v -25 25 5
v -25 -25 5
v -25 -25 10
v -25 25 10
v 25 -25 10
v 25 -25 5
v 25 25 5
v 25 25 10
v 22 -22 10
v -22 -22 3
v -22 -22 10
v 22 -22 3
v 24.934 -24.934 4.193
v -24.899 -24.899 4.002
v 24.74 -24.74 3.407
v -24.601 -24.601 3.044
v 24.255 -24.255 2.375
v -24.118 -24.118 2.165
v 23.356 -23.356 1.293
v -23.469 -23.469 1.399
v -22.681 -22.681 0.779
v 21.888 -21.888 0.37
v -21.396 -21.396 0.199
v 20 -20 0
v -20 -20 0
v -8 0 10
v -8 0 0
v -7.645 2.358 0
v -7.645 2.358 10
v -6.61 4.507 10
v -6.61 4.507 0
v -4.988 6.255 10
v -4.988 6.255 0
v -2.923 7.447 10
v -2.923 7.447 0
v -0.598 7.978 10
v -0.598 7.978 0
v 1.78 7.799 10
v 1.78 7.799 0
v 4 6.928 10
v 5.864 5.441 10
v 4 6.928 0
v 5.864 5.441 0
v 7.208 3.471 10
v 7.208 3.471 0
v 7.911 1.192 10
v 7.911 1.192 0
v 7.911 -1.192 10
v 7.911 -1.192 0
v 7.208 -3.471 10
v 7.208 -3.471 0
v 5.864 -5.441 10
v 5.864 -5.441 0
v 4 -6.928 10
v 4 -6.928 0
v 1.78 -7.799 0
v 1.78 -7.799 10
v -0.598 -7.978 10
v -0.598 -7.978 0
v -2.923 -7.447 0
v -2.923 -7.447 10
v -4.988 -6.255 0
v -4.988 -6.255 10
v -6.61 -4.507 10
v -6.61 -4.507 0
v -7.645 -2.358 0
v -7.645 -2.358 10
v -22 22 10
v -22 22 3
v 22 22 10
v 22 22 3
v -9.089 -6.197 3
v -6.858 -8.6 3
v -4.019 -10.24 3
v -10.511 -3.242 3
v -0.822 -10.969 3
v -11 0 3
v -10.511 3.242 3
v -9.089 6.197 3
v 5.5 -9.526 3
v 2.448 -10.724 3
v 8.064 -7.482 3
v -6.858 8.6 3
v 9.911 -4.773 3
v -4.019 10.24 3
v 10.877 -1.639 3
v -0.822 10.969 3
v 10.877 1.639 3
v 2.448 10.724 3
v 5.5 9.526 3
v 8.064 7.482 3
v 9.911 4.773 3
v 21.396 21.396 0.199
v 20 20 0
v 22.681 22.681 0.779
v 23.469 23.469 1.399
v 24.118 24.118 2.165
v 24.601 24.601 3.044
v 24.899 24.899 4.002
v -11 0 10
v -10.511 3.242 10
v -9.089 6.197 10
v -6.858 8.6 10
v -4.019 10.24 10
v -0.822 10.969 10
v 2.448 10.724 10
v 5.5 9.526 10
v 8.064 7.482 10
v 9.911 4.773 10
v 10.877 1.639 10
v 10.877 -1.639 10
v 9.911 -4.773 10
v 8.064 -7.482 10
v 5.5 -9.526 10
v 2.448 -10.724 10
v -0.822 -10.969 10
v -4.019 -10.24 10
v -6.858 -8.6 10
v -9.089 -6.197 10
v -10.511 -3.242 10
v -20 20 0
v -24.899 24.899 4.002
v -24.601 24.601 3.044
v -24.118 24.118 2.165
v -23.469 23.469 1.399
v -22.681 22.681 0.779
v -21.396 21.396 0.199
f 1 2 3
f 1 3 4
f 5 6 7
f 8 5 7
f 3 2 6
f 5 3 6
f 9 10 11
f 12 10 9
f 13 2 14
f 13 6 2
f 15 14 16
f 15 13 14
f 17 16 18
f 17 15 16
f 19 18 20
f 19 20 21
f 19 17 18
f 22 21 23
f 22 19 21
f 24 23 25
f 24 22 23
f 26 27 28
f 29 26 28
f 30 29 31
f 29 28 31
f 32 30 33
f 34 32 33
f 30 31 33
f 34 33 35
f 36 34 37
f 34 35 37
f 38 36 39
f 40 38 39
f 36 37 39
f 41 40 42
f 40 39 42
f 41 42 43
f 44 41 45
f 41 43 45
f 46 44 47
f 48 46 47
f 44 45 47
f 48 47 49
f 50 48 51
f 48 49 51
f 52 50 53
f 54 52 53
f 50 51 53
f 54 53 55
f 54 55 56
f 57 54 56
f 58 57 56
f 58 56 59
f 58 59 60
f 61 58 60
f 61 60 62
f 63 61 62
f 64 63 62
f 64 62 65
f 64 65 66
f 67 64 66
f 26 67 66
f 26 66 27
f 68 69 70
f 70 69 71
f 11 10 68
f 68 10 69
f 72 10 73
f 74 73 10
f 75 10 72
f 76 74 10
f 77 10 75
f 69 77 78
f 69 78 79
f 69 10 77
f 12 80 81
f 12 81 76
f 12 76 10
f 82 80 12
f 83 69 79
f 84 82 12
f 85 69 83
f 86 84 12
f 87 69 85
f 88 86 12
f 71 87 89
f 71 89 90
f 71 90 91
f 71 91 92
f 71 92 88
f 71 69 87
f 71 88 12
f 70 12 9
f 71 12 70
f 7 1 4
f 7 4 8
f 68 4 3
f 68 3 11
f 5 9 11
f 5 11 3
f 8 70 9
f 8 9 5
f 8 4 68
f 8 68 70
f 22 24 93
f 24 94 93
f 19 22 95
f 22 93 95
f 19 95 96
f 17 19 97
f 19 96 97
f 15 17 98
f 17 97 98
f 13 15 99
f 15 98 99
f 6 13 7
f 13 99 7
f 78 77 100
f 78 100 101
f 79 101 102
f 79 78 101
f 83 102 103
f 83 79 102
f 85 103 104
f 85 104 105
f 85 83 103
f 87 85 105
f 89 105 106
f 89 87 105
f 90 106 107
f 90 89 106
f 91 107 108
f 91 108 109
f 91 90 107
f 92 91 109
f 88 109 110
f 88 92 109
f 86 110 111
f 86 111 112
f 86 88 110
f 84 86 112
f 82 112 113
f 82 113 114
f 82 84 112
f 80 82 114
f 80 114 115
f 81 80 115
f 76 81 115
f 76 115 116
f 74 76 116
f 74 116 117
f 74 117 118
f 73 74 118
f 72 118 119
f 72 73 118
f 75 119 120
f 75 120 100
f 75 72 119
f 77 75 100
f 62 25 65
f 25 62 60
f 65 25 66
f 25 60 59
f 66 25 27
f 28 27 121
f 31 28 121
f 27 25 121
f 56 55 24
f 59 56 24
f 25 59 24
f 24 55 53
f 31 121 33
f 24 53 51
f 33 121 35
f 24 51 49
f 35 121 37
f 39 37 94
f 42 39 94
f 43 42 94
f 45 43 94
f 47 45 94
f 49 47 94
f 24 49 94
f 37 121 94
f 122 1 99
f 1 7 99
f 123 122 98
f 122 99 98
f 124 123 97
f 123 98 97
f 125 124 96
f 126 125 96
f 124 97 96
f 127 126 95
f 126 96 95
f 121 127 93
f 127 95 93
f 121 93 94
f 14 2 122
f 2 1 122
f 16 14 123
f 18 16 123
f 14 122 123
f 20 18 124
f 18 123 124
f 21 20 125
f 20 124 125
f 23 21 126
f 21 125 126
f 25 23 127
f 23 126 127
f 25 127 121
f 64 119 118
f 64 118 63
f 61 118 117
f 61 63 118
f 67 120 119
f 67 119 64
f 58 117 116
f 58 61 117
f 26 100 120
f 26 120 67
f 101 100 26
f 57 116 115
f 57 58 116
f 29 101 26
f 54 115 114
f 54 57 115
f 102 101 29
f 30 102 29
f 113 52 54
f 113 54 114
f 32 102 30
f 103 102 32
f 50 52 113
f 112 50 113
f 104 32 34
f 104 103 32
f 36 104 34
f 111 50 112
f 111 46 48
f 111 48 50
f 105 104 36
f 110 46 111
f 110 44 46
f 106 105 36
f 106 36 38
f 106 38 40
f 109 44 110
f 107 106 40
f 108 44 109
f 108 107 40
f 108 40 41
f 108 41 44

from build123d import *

# Parameters (mm, degrees)
F0_W     = 50
F0_H     = 50
F1_DEPTH = 10
F4_D     = 16
F5_T     = -3
F6_R     = 5


with BuildPart() as f1:
    # F0 (on Top) → F1 (new body)
    with BuildSketch(Plane.XY):
        Rectangle(F0_W, F0_H)
    extrude(amount=F1_DEPTH)

    # F4 (through all)
    with Locations(Plane.XY.offset(10)):
        with Locations((0, 0)):
            Hole(F4_D / 2)

    # F5
    f5_openings = [f1.faces().sort_by_distance(p)[0] for p in [
        (24.292893, 0, 10),
    ]]
    offset(amount=F5_T, openings=f5_openings)

    # F6
    f6_edges = [f1.edges().sort_by_distance(p)[0] for p in [
        (-25, 0, 0),
        (0, 25, 0),
        (25, 0, 0),
        (0, -25, 0),
    ]]
    fillet(f6_edges, radius=F6_R)


solid = f1.part
